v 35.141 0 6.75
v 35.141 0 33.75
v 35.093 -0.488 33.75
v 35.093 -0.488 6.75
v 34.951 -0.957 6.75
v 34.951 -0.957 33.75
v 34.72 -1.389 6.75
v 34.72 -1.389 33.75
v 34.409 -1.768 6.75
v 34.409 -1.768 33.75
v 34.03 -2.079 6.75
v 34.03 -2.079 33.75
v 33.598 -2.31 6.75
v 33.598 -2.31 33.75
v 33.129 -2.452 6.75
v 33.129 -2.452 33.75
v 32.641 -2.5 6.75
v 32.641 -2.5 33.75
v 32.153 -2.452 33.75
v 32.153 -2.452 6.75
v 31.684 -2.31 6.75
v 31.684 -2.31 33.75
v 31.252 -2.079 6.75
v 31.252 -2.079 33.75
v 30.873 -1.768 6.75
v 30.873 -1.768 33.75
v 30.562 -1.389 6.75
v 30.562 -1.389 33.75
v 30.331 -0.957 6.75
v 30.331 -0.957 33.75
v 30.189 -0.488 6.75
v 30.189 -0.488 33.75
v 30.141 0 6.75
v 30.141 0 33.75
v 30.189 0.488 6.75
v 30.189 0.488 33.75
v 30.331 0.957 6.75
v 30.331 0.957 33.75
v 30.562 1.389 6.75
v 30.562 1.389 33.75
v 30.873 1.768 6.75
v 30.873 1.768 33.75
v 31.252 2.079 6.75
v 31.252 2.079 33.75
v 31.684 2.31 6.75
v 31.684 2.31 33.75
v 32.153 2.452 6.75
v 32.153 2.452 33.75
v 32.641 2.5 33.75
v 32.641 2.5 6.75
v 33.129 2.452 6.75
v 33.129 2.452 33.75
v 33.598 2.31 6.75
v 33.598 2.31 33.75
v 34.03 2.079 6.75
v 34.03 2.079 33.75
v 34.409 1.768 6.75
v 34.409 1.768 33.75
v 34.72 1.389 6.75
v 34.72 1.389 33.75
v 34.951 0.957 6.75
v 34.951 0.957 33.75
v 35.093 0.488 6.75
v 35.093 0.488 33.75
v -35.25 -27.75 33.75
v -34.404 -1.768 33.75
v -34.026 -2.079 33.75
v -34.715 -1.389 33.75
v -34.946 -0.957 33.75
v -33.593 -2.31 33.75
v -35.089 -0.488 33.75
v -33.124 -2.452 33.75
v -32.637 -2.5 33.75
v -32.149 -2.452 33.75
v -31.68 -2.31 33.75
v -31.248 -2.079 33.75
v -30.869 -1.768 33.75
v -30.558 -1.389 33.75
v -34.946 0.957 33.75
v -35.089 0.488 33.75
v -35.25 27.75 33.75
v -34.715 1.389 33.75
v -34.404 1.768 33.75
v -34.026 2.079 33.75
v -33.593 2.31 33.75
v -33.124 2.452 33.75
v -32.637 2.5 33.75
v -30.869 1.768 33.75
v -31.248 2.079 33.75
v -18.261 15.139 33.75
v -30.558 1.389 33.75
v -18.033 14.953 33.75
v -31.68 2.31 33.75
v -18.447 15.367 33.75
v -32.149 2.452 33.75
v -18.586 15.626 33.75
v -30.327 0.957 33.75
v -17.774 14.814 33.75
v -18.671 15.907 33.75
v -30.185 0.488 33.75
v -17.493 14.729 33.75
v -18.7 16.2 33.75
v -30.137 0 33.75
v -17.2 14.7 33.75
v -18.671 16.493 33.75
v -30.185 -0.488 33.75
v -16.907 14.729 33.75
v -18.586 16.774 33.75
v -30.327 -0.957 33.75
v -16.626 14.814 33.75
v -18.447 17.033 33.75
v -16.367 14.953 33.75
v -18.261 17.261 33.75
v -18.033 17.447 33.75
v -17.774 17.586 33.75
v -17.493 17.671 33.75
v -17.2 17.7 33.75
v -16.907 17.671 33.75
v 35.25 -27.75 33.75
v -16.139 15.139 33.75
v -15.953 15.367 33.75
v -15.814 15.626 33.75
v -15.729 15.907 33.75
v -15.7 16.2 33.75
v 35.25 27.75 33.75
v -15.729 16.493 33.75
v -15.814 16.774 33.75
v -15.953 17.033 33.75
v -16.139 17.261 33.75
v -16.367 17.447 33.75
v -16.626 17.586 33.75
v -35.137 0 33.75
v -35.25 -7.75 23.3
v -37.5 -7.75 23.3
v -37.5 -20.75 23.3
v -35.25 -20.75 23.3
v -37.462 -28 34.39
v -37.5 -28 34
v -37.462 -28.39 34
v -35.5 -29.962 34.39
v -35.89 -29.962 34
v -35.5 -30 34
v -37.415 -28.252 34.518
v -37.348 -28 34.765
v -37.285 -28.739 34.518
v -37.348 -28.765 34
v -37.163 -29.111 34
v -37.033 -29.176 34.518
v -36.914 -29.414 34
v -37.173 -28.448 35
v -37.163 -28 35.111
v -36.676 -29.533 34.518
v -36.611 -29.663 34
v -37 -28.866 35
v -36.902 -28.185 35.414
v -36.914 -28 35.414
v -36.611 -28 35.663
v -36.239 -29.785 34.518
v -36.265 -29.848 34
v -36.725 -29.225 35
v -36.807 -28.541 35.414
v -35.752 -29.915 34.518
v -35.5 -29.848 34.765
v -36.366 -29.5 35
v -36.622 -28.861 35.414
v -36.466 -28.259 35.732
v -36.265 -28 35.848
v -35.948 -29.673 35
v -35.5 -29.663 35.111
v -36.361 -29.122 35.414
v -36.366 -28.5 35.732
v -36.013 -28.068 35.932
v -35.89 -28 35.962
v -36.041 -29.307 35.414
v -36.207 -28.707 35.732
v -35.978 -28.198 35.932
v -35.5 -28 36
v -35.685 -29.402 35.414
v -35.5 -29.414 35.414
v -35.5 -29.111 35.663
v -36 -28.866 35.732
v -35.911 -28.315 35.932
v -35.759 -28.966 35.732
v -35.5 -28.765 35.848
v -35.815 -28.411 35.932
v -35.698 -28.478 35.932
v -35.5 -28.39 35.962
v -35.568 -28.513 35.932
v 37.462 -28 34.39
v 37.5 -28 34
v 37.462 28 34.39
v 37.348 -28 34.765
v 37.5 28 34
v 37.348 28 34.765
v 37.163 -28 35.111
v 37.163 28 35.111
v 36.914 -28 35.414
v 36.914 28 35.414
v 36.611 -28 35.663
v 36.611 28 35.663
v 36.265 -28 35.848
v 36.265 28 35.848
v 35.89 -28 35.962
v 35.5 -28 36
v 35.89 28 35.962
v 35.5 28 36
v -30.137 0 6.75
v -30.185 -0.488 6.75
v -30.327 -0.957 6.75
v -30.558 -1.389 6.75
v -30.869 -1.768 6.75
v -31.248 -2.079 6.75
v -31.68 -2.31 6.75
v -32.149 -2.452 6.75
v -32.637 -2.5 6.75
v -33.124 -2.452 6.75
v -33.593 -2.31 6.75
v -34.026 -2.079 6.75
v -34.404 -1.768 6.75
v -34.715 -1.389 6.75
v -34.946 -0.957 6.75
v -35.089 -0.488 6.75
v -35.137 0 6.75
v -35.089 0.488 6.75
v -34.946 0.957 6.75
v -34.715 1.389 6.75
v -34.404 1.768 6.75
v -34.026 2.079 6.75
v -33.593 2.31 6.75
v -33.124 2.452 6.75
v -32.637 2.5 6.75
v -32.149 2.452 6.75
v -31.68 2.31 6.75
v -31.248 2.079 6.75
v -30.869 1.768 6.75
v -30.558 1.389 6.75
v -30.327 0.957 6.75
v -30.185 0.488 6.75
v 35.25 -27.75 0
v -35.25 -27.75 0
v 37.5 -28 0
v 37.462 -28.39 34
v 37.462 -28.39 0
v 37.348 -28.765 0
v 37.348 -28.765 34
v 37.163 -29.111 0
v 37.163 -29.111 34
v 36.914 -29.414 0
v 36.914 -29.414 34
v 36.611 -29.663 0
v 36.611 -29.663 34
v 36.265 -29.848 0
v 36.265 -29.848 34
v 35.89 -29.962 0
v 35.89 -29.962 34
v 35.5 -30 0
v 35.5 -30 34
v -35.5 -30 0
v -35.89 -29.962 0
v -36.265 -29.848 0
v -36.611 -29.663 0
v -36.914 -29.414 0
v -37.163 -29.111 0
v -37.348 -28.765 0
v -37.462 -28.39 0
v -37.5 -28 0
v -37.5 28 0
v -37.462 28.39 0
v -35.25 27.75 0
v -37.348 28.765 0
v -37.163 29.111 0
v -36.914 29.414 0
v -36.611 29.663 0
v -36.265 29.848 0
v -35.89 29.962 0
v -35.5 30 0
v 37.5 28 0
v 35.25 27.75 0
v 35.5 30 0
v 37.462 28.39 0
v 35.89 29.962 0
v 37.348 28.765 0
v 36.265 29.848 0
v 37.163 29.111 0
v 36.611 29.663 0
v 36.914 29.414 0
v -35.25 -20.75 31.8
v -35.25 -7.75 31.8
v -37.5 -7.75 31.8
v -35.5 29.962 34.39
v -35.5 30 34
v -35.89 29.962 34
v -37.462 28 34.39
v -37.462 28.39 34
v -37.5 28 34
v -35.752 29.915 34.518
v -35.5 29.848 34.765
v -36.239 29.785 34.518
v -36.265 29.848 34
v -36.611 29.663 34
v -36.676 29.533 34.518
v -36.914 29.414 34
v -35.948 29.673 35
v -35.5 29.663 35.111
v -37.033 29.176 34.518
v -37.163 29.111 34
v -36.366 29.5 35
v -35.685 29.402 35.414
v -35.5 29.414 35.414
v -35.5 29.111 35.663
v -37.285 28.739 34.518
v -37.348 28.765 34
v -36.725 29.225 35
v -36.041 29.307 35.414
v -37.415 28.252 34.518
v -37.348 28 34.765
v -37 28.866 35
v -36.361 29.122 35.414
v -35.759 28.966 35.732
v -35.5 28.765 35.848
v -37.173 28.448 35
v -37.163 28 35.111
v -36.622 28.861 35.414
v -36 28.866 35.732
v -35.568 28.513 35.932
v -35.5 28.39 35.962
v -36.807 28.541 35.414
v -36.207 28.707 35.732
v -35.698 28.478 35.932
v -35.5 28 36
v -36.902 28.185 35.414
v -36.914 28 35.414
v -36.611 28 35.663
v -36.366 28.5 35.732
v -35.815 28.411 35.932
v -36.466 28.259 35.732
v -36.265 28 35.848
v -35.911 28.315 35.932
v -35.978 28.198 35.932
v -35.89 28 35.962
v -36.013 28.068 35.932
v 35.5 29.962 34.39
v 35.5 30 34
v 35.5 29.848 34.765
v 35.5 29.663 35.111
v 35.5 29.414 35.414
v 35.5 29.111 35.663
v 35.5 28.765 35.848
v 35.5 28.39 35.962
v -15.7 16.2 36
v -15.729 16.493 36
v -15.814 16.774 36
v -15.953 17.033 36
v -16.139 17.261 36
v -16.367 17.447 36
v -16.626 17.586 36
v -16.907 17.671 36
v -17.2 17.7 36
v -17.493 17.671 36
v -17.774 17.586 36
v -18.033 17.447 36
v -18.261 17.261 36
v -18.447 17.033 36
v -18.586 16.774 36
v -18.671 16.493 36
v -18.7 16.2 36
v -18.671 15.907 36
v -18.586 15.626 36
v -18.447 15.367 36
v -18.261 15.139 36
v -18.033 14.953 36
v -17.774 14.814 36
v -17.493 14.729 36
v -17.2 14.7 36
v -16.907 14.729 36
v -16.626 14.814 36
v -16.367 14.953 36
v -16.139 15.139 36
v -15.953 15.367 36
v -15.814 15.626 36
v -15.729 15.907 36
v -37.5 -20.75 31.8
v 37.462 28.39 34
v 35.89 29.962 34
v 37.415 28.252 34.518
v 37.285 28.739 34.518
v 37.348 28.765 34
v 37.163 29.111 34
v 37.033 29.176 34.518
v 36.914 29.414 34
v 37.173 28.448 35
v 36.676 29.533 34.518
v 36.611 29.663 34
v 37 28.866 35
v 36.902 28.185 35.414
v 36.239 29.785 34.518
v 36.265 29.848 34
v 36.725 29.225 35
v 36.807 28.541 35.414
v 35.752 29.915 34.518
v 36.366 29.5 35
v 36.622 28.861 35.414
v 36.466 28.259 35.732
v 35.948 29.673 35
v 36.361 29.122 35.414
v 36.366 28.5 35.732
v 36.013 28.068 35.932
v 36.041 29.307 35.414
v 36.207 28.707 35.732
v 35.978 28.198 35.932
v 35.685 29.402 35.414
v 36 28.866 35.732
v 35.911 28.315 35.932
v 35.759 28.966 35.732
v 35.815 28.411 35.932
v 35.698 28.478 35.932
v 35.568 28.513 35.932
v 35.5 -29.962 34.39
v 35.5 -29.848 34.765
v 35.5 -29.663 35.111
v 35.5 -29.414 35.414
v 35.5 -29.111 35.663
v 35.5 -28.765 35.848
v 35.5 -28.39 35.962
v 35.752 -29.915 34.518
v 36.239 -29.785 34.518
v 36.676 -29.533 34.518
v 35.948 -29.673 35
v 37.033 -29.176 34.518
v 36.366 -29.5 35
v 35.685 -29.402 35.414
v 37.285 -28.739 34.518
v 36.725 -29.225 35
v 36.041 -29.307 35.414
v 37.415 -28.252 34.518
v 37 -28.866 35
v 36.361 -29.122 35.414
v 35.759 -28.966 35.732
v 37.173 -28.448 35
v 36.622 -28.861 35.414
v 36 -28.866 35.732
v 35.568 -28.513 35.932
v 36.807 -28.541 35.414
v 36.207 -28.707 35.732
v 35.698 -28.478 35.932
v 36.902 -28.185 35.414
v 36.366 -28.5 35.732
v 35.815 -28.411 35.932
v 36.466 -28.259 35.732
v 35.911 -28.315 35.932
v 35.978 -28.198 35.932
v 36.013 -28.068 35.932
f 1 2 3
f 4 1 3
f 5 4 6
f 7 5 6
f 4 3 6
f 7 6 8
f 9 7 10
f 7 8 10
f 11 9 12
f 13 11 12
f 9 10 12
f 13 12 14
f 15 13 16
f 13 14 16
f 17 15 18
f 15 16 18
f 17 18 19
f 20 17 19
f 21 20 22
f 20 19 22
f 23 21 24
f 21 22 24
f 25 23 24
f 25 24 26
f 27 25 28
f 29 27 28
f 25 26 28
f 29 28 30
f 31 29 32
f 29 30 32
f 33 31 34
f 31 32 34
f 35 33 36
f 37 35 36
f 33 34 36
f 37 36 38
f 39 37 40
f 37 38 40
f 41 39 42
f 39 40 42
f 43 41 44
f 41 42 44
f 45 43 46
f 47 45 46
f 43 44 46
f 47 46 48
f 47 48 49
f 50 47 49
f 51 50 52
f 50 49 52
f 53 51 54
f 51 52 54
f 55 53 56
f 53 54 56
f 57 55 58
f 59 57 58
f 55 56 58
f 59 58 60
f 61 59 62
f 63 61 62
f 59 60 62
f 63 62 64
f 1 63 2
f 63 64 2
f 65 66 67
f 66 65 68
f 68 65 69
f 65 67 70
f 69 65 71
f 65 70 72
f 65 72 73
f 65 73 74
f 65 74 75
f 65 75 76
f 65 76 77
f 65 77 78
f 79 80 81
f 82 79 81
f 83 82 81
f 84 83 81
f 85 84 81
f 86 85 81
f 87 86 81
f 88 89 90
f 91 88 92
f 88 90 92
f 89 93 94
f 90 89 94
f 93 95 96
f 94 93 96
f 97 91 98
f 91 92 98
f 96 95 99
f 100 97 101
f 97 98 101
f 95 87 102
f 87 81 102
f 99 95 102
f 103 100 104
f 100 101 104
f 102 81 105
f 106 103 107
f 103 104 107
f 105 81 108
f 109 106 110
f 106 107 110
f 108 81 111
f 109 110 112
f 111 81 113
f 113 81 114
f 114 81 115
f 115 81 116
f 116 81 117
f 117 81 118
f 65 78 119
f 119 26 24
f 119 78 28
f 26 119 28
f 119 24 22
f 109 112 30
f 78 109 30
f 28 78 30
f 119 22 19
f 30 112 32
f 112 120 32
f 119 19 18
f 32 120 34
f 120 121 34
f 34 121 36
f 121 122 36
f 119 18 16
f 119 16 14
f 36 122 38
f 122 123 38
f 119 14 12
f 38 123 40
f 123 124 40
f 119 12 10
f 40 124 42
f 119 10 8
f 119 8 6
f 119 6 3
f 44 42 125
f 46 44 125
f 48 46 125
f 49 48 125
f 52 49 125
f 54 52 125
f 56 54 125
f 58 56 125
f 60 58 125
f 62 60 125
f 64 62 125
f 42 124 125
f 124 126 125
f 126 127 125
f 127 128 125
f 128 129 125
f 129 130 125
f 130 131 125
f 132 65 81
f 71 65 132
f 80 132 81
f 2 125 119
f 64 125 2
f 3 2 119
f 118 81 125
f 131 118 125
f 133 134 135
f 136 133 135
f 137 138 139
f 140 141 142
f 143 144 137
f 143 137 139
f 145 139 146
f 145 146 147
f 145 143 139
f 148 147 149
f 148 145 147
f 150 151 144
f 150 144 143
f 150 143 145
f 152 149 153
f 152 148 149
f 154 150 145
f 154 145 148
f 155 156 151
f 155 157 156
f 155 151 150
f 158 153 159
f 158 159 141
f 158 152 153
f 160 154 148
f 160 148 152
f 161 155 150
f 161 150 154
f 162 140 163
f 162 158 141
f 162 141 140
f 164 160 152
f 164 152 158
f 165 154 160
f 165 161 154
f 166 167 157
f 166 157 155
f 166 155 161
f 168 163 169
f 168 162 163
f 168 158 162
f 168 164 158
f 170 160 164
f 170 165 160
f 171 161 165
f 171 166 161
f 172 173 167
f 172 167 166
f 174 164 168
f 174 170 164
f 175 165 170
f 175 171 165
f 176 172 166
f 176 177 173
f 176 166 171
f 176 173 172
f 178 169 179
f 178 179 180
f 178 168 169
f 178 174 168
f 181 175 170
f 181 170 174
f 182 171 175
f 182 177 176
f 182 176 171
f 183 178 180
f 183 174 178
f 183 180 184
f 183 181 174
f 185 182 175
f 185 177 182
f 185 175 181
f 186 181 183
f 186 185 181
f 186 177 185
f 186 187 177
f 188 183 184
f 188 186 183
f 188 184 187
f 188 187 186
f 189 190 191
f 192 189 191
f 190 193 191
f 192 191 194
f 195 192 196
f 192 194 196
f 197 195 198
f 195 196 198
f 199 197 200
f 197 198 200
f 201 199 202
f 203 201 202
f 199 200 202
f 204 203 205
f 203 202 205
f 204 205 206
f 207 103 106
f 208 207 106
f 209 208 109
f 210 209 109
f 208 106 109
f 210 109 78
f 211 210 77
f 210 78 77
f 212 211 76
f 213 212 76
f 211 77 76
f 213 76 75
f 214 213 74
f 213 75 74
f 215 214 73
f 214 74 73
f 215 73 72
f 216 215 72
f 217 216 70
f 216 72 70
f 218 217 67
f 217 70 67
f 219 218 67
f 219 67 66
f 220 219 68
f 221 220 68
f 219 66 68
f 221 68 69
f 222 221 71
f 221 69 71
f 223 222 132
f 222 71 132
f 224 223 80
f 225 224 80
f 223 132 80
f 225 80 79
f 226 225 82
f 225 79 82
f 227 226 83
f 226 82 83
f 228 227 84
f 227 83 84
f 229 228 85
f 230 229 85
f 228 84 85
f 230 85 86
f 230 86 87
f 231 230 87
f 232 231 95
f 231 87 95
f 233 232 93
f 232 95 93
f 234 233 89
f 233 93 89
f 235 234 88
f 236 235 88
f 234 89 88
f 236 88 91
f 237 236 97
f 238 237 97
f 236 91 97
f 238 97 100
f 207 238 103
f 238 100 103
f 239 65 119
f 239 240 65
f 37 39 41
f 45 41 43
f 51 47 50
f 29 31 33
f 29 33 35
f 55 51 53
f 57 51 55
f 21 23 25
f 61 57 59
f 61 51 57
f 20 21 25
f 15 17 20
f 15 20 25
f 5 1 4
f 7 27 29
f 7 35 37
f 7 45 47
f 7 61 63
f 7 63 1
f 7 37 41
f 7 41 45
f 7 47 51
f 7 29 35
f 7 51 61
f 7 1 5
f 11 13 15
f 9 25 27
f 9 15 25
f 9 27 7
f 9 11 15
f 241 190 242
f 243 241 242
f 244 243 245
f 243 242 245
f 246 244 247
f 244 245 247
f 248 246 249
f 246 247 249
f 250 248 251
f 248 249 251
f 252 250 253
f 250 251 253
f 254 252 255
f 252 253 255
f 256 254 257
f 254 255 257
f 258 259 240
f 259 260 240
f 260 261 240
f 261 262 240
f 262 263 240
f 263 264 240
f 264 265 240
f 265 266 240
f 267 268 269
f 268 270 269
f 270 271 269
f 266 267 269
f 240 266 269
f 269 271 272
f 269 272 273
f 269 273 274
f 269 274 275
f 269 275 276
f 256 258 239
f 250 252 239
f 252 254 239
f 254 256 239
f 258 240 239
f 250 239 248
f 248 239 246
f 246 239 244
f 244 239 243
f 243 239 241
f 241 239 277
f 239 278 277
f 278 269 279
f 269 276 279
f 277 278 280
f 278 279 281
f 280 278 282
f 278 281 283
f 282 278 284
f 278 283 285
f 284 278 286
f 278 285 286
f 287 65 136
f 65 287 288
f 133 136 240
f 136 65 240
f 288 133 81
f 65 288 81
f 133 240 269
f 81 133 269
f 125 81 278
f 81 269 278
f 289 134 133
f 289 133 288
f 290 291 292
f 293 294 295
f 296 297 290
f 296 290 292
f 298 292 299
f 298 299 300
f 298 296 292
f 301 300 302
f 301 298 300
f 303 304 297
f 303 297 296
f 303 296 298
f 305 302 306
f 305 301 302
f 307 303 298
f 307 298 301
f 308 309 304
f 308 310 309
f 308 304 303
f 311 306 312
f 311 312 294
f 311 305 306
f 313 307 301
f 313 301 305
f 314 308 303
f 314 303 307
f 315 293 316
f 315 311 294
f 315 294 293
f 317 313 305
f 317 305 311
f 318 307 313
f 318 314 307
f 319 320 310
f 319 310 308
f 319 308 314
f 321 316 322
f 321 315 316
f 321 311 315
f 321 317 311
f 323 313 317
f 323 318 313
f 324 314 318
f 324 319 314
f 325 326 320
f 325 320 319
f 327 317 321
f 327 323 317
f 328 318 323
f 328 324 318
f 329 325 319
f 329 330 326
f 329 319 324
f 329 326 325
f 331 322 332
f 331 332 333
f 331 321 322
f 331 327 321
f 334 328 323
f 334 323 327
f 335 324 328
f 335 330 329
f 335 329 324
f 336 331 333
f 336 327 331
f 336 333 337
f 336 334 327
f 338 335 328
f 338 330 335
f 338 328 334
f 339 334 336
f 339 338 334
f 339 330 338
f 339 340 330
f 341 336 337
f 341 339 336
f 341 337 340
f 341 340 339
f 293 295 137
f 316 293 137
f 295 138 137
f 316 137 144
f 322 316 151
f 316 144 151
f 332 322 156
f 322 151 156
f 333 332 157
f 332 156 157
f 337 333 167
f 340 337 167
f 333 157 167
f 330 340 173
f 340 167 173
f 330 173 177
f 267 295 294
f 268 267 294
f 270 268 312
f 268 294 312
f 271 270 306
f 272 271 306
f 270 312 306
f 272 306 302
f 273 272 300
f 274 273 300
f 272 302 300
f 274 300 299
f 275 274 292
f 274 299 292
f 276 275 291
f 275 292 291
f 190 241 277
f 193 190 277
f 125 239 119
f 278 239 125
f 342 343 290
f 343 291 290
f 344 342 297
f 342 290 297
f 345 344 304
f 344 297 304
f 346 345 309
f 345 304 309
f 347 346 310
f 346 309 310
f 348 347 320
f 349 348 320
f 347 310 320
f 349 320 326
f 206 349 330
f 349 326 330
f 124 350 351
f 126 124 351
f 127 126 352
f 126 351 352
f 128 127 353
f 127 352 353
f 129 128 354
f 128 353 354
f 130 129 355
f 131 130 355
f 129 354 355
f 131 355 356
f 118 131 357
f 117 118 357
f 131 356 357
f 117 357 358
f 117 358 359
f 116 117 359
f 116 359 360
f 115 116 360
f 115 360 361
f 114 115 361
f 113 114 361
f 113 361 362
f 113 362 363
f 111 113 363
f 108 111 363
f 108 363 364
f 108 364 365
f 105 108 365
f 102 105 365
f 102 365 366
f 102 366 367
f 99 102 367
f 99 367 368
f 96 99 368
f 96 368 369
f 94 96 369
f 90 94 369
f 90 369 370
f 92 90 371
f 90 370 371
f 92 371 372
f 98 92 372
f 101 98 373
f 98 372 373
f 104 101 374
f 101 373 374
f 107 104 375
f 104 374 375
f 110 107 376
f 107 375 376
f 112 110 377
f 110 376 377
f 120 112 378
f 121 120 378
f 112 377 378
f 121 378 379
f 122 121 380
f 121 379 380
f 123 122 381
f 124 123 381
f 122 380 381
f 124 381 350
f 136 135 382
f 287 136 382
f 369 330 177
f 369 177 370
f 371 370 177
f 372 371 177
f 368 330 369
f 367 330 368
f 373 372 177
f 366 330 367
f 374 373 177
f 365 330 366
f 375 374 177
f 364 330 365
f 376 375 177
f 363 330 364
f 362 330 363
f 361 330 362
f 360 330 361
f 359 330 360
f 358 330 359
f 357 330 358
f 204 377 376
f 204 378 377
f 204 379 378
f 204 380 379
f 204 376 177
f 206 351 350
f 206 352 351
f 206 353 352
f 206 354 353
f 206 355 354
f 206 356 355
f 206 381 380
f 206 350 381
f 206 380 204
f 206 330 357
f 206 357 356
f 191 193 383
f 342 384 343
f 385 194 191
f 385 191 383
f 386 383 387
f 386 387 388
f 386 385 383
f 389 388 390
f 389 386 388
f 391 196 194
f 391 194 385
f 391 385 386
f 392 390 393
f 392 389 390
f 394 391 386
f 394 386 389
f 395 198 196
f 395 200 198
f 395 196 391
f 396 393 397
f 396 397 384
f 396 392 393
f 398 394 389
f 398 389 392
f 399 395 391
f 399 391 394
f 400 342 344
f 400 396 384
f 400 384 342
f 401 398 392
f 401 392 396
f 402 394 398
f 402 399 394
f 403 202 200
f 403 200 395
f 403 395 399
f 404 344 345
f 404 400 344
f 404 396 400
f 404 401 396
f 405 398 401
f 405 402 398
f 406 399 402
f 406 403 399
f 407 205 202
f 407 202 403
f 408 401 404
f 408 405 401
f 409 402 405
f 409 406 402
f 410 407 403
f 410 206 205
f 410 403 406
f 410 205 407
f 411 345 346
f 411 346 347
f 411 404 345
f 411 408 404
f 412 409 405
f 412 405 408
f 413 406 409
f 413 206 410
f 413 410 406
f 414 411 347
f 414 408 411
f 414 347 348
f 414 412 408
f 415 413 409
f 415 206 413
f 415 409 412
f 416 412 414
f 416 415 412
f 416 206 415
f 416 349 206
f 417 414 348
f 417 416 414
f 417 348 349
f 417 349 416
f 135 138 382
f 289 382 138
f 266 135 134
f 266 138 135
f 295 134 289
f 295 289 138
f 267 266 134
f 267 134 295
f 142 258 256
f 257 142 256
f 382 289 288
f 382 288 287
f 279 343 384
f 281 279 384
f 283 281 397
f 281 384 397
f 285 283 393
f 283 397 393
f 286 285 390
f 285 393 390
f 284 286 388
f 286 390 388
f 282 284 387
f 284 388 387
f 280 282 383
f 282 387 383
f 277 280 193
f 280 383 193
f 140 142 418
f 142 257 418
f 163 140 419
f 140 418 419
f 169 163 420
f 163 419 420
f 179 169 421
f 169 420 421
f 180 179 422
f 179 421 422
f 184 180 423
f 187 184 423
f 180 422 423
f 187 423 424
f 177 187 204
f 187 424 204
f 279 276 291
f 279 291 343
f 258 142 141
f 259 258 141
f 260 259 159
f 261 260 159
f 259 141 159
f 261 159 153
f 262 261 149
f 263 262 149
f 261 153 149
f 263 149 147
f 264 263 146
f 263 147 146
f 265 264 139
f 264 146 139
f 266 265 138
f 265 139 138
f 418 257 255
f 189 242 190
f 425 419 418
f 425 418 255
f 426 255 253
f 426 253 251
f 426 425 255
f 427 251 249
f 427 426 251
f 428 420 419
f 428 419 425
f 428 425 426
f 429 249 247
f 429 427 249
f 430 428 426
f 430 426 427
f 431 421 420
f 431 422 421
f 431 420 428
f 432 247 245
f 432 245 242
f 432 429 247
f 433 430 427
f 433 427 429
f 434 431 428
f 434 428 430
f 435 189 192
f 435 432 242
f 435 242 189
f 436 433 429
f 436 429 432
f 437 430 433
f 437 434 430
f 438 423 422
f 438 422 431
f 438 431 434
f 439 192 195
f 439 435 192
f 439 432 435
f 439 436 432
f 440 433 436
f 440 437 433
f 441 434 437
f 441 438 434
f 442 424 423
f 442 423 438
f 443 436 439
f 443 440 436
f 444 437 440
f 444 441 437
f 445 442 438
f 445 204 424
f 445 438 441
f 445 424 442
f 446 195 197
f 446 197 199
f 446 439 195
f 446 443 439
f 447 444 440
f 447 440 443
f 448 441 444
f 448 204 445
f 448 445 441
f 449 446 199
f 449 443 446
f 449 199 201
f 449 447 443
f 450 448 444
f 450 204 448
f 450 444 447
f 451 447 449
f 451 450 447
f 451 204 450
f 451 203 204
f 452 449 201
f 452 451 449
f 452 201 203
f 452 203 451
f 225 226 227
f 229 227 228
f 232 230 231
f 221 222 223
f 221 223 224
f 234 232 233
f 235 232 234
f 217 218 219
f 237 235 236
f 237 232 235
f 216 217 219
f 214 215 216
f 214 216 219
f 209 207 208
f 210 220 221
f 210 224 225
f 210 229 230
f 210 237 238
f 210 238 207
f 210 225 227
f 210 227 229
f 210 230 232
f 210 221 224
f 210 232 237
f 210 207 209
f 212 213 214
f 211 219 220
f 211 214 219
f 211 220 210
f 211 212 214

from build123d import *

# Parameters (mm, degrees)
F0_W      = 75
F0_H      = 60
F1_DEPTH  = 36
F2_R      = 2
F3_R      = 2
F4_R      = 2
F5_R      = 2
F6_R      = 2
F7_T      = -2.25
F8_R      = 2.5
F9_DEPTH  = 27
F10_W     = 13
F10_H     = 8.5
F11_DEPTH = 25
F12_R     = 1.5
F13_DEPTH = 25


with BuildPart() as f1:
    # F0 (on Top) → F1 (new body)
    with BuildSketch(Plane.XY):
        Rectangle(F0_W, F0_H)
    extrude(amount=F1_DEPTH)

    # F2
    f2_edges = [f1.edges().sort_by_distance(p)[0] for p in [
        (-37.5, 30, 18),
    ]]
    fillet(f2_edges, radius=F2_R)

    # F3
    f3_edges = [f1.edges().sort_by_distance(p)[0] for p in [
        (37.5, 30, 18),
    ]]
    fillet(f3_edges, radius=F3_R)

    # F4
    f4_edges = [f1.edges().sort_by_distance(p)[0] for p in [
        (37.5, -30, 18),
    ]]
    fillet(f4_edges, radius=F4_R)

    # F5
    f5_edges = [f1.edges().sort_by_distance(p)[0] for p in [
        (-37.5, -30, 18),
    ]]
    fillet(f5_edges, radius=F5_R)

    # F6
    f6_edges = [f1.edges().sort_by_distance(p)[0] for p in [
        (37.5, 0, 36),
        (0, -30, 36),
        (-37.5, 0, 36),
        (-36.914214, -29.414214, 36),
        (36.914214, -29.414214, 36),
        (-36.914214, 29.414214, 36),
        (36.914214, 29.414214, 36),
        (0, 30, 36),
    ]]
    fillet(f6_edges, radius=F6_R)

    # F7
    f7_openings = [f1.faces().sort_by_distance(p)[0] for p in [
        (0, 0, 0),
    ]]
    offset(amount=F7_T, openings=f7_openings)

    # F8 (on face) → F9 (join)
    with BuildSketch(Plane(origin=(0, 0, 33.75), x_dir=(1, 0, 0), z_dir=(0, 0, -1))):
        with Locations((-32.636665, 0)):
            Circle(F8_R)
        with Locations((32.640941, 0)):
            Circle(F8_R)
    extrude(amount=F9_DEPTH)

    # F10 (on face) → F11 (cut)
    with BuildSketch(Plane(origin=(-37.5, 0, 0), x_dir=(0, -1, 0), z_dir=(-1, 0, 0))):
        with Locations((14.25, 27.55)):
            Rectangle(F10_W, F10_H)
    extrude(amount=-F11_DEPTH, mode=Mode.SUBTRACT)

    # F12 (on face) → F13 (cut)
    with BuildSketch(Plane.XY.offset(36)):
        with Locations((-17.2, 16.2)):
            Circle(F12_R)
    extrude(amount=-F13_DEPTH, mode=Mode.SUBTRACT)


solid = f1.part
